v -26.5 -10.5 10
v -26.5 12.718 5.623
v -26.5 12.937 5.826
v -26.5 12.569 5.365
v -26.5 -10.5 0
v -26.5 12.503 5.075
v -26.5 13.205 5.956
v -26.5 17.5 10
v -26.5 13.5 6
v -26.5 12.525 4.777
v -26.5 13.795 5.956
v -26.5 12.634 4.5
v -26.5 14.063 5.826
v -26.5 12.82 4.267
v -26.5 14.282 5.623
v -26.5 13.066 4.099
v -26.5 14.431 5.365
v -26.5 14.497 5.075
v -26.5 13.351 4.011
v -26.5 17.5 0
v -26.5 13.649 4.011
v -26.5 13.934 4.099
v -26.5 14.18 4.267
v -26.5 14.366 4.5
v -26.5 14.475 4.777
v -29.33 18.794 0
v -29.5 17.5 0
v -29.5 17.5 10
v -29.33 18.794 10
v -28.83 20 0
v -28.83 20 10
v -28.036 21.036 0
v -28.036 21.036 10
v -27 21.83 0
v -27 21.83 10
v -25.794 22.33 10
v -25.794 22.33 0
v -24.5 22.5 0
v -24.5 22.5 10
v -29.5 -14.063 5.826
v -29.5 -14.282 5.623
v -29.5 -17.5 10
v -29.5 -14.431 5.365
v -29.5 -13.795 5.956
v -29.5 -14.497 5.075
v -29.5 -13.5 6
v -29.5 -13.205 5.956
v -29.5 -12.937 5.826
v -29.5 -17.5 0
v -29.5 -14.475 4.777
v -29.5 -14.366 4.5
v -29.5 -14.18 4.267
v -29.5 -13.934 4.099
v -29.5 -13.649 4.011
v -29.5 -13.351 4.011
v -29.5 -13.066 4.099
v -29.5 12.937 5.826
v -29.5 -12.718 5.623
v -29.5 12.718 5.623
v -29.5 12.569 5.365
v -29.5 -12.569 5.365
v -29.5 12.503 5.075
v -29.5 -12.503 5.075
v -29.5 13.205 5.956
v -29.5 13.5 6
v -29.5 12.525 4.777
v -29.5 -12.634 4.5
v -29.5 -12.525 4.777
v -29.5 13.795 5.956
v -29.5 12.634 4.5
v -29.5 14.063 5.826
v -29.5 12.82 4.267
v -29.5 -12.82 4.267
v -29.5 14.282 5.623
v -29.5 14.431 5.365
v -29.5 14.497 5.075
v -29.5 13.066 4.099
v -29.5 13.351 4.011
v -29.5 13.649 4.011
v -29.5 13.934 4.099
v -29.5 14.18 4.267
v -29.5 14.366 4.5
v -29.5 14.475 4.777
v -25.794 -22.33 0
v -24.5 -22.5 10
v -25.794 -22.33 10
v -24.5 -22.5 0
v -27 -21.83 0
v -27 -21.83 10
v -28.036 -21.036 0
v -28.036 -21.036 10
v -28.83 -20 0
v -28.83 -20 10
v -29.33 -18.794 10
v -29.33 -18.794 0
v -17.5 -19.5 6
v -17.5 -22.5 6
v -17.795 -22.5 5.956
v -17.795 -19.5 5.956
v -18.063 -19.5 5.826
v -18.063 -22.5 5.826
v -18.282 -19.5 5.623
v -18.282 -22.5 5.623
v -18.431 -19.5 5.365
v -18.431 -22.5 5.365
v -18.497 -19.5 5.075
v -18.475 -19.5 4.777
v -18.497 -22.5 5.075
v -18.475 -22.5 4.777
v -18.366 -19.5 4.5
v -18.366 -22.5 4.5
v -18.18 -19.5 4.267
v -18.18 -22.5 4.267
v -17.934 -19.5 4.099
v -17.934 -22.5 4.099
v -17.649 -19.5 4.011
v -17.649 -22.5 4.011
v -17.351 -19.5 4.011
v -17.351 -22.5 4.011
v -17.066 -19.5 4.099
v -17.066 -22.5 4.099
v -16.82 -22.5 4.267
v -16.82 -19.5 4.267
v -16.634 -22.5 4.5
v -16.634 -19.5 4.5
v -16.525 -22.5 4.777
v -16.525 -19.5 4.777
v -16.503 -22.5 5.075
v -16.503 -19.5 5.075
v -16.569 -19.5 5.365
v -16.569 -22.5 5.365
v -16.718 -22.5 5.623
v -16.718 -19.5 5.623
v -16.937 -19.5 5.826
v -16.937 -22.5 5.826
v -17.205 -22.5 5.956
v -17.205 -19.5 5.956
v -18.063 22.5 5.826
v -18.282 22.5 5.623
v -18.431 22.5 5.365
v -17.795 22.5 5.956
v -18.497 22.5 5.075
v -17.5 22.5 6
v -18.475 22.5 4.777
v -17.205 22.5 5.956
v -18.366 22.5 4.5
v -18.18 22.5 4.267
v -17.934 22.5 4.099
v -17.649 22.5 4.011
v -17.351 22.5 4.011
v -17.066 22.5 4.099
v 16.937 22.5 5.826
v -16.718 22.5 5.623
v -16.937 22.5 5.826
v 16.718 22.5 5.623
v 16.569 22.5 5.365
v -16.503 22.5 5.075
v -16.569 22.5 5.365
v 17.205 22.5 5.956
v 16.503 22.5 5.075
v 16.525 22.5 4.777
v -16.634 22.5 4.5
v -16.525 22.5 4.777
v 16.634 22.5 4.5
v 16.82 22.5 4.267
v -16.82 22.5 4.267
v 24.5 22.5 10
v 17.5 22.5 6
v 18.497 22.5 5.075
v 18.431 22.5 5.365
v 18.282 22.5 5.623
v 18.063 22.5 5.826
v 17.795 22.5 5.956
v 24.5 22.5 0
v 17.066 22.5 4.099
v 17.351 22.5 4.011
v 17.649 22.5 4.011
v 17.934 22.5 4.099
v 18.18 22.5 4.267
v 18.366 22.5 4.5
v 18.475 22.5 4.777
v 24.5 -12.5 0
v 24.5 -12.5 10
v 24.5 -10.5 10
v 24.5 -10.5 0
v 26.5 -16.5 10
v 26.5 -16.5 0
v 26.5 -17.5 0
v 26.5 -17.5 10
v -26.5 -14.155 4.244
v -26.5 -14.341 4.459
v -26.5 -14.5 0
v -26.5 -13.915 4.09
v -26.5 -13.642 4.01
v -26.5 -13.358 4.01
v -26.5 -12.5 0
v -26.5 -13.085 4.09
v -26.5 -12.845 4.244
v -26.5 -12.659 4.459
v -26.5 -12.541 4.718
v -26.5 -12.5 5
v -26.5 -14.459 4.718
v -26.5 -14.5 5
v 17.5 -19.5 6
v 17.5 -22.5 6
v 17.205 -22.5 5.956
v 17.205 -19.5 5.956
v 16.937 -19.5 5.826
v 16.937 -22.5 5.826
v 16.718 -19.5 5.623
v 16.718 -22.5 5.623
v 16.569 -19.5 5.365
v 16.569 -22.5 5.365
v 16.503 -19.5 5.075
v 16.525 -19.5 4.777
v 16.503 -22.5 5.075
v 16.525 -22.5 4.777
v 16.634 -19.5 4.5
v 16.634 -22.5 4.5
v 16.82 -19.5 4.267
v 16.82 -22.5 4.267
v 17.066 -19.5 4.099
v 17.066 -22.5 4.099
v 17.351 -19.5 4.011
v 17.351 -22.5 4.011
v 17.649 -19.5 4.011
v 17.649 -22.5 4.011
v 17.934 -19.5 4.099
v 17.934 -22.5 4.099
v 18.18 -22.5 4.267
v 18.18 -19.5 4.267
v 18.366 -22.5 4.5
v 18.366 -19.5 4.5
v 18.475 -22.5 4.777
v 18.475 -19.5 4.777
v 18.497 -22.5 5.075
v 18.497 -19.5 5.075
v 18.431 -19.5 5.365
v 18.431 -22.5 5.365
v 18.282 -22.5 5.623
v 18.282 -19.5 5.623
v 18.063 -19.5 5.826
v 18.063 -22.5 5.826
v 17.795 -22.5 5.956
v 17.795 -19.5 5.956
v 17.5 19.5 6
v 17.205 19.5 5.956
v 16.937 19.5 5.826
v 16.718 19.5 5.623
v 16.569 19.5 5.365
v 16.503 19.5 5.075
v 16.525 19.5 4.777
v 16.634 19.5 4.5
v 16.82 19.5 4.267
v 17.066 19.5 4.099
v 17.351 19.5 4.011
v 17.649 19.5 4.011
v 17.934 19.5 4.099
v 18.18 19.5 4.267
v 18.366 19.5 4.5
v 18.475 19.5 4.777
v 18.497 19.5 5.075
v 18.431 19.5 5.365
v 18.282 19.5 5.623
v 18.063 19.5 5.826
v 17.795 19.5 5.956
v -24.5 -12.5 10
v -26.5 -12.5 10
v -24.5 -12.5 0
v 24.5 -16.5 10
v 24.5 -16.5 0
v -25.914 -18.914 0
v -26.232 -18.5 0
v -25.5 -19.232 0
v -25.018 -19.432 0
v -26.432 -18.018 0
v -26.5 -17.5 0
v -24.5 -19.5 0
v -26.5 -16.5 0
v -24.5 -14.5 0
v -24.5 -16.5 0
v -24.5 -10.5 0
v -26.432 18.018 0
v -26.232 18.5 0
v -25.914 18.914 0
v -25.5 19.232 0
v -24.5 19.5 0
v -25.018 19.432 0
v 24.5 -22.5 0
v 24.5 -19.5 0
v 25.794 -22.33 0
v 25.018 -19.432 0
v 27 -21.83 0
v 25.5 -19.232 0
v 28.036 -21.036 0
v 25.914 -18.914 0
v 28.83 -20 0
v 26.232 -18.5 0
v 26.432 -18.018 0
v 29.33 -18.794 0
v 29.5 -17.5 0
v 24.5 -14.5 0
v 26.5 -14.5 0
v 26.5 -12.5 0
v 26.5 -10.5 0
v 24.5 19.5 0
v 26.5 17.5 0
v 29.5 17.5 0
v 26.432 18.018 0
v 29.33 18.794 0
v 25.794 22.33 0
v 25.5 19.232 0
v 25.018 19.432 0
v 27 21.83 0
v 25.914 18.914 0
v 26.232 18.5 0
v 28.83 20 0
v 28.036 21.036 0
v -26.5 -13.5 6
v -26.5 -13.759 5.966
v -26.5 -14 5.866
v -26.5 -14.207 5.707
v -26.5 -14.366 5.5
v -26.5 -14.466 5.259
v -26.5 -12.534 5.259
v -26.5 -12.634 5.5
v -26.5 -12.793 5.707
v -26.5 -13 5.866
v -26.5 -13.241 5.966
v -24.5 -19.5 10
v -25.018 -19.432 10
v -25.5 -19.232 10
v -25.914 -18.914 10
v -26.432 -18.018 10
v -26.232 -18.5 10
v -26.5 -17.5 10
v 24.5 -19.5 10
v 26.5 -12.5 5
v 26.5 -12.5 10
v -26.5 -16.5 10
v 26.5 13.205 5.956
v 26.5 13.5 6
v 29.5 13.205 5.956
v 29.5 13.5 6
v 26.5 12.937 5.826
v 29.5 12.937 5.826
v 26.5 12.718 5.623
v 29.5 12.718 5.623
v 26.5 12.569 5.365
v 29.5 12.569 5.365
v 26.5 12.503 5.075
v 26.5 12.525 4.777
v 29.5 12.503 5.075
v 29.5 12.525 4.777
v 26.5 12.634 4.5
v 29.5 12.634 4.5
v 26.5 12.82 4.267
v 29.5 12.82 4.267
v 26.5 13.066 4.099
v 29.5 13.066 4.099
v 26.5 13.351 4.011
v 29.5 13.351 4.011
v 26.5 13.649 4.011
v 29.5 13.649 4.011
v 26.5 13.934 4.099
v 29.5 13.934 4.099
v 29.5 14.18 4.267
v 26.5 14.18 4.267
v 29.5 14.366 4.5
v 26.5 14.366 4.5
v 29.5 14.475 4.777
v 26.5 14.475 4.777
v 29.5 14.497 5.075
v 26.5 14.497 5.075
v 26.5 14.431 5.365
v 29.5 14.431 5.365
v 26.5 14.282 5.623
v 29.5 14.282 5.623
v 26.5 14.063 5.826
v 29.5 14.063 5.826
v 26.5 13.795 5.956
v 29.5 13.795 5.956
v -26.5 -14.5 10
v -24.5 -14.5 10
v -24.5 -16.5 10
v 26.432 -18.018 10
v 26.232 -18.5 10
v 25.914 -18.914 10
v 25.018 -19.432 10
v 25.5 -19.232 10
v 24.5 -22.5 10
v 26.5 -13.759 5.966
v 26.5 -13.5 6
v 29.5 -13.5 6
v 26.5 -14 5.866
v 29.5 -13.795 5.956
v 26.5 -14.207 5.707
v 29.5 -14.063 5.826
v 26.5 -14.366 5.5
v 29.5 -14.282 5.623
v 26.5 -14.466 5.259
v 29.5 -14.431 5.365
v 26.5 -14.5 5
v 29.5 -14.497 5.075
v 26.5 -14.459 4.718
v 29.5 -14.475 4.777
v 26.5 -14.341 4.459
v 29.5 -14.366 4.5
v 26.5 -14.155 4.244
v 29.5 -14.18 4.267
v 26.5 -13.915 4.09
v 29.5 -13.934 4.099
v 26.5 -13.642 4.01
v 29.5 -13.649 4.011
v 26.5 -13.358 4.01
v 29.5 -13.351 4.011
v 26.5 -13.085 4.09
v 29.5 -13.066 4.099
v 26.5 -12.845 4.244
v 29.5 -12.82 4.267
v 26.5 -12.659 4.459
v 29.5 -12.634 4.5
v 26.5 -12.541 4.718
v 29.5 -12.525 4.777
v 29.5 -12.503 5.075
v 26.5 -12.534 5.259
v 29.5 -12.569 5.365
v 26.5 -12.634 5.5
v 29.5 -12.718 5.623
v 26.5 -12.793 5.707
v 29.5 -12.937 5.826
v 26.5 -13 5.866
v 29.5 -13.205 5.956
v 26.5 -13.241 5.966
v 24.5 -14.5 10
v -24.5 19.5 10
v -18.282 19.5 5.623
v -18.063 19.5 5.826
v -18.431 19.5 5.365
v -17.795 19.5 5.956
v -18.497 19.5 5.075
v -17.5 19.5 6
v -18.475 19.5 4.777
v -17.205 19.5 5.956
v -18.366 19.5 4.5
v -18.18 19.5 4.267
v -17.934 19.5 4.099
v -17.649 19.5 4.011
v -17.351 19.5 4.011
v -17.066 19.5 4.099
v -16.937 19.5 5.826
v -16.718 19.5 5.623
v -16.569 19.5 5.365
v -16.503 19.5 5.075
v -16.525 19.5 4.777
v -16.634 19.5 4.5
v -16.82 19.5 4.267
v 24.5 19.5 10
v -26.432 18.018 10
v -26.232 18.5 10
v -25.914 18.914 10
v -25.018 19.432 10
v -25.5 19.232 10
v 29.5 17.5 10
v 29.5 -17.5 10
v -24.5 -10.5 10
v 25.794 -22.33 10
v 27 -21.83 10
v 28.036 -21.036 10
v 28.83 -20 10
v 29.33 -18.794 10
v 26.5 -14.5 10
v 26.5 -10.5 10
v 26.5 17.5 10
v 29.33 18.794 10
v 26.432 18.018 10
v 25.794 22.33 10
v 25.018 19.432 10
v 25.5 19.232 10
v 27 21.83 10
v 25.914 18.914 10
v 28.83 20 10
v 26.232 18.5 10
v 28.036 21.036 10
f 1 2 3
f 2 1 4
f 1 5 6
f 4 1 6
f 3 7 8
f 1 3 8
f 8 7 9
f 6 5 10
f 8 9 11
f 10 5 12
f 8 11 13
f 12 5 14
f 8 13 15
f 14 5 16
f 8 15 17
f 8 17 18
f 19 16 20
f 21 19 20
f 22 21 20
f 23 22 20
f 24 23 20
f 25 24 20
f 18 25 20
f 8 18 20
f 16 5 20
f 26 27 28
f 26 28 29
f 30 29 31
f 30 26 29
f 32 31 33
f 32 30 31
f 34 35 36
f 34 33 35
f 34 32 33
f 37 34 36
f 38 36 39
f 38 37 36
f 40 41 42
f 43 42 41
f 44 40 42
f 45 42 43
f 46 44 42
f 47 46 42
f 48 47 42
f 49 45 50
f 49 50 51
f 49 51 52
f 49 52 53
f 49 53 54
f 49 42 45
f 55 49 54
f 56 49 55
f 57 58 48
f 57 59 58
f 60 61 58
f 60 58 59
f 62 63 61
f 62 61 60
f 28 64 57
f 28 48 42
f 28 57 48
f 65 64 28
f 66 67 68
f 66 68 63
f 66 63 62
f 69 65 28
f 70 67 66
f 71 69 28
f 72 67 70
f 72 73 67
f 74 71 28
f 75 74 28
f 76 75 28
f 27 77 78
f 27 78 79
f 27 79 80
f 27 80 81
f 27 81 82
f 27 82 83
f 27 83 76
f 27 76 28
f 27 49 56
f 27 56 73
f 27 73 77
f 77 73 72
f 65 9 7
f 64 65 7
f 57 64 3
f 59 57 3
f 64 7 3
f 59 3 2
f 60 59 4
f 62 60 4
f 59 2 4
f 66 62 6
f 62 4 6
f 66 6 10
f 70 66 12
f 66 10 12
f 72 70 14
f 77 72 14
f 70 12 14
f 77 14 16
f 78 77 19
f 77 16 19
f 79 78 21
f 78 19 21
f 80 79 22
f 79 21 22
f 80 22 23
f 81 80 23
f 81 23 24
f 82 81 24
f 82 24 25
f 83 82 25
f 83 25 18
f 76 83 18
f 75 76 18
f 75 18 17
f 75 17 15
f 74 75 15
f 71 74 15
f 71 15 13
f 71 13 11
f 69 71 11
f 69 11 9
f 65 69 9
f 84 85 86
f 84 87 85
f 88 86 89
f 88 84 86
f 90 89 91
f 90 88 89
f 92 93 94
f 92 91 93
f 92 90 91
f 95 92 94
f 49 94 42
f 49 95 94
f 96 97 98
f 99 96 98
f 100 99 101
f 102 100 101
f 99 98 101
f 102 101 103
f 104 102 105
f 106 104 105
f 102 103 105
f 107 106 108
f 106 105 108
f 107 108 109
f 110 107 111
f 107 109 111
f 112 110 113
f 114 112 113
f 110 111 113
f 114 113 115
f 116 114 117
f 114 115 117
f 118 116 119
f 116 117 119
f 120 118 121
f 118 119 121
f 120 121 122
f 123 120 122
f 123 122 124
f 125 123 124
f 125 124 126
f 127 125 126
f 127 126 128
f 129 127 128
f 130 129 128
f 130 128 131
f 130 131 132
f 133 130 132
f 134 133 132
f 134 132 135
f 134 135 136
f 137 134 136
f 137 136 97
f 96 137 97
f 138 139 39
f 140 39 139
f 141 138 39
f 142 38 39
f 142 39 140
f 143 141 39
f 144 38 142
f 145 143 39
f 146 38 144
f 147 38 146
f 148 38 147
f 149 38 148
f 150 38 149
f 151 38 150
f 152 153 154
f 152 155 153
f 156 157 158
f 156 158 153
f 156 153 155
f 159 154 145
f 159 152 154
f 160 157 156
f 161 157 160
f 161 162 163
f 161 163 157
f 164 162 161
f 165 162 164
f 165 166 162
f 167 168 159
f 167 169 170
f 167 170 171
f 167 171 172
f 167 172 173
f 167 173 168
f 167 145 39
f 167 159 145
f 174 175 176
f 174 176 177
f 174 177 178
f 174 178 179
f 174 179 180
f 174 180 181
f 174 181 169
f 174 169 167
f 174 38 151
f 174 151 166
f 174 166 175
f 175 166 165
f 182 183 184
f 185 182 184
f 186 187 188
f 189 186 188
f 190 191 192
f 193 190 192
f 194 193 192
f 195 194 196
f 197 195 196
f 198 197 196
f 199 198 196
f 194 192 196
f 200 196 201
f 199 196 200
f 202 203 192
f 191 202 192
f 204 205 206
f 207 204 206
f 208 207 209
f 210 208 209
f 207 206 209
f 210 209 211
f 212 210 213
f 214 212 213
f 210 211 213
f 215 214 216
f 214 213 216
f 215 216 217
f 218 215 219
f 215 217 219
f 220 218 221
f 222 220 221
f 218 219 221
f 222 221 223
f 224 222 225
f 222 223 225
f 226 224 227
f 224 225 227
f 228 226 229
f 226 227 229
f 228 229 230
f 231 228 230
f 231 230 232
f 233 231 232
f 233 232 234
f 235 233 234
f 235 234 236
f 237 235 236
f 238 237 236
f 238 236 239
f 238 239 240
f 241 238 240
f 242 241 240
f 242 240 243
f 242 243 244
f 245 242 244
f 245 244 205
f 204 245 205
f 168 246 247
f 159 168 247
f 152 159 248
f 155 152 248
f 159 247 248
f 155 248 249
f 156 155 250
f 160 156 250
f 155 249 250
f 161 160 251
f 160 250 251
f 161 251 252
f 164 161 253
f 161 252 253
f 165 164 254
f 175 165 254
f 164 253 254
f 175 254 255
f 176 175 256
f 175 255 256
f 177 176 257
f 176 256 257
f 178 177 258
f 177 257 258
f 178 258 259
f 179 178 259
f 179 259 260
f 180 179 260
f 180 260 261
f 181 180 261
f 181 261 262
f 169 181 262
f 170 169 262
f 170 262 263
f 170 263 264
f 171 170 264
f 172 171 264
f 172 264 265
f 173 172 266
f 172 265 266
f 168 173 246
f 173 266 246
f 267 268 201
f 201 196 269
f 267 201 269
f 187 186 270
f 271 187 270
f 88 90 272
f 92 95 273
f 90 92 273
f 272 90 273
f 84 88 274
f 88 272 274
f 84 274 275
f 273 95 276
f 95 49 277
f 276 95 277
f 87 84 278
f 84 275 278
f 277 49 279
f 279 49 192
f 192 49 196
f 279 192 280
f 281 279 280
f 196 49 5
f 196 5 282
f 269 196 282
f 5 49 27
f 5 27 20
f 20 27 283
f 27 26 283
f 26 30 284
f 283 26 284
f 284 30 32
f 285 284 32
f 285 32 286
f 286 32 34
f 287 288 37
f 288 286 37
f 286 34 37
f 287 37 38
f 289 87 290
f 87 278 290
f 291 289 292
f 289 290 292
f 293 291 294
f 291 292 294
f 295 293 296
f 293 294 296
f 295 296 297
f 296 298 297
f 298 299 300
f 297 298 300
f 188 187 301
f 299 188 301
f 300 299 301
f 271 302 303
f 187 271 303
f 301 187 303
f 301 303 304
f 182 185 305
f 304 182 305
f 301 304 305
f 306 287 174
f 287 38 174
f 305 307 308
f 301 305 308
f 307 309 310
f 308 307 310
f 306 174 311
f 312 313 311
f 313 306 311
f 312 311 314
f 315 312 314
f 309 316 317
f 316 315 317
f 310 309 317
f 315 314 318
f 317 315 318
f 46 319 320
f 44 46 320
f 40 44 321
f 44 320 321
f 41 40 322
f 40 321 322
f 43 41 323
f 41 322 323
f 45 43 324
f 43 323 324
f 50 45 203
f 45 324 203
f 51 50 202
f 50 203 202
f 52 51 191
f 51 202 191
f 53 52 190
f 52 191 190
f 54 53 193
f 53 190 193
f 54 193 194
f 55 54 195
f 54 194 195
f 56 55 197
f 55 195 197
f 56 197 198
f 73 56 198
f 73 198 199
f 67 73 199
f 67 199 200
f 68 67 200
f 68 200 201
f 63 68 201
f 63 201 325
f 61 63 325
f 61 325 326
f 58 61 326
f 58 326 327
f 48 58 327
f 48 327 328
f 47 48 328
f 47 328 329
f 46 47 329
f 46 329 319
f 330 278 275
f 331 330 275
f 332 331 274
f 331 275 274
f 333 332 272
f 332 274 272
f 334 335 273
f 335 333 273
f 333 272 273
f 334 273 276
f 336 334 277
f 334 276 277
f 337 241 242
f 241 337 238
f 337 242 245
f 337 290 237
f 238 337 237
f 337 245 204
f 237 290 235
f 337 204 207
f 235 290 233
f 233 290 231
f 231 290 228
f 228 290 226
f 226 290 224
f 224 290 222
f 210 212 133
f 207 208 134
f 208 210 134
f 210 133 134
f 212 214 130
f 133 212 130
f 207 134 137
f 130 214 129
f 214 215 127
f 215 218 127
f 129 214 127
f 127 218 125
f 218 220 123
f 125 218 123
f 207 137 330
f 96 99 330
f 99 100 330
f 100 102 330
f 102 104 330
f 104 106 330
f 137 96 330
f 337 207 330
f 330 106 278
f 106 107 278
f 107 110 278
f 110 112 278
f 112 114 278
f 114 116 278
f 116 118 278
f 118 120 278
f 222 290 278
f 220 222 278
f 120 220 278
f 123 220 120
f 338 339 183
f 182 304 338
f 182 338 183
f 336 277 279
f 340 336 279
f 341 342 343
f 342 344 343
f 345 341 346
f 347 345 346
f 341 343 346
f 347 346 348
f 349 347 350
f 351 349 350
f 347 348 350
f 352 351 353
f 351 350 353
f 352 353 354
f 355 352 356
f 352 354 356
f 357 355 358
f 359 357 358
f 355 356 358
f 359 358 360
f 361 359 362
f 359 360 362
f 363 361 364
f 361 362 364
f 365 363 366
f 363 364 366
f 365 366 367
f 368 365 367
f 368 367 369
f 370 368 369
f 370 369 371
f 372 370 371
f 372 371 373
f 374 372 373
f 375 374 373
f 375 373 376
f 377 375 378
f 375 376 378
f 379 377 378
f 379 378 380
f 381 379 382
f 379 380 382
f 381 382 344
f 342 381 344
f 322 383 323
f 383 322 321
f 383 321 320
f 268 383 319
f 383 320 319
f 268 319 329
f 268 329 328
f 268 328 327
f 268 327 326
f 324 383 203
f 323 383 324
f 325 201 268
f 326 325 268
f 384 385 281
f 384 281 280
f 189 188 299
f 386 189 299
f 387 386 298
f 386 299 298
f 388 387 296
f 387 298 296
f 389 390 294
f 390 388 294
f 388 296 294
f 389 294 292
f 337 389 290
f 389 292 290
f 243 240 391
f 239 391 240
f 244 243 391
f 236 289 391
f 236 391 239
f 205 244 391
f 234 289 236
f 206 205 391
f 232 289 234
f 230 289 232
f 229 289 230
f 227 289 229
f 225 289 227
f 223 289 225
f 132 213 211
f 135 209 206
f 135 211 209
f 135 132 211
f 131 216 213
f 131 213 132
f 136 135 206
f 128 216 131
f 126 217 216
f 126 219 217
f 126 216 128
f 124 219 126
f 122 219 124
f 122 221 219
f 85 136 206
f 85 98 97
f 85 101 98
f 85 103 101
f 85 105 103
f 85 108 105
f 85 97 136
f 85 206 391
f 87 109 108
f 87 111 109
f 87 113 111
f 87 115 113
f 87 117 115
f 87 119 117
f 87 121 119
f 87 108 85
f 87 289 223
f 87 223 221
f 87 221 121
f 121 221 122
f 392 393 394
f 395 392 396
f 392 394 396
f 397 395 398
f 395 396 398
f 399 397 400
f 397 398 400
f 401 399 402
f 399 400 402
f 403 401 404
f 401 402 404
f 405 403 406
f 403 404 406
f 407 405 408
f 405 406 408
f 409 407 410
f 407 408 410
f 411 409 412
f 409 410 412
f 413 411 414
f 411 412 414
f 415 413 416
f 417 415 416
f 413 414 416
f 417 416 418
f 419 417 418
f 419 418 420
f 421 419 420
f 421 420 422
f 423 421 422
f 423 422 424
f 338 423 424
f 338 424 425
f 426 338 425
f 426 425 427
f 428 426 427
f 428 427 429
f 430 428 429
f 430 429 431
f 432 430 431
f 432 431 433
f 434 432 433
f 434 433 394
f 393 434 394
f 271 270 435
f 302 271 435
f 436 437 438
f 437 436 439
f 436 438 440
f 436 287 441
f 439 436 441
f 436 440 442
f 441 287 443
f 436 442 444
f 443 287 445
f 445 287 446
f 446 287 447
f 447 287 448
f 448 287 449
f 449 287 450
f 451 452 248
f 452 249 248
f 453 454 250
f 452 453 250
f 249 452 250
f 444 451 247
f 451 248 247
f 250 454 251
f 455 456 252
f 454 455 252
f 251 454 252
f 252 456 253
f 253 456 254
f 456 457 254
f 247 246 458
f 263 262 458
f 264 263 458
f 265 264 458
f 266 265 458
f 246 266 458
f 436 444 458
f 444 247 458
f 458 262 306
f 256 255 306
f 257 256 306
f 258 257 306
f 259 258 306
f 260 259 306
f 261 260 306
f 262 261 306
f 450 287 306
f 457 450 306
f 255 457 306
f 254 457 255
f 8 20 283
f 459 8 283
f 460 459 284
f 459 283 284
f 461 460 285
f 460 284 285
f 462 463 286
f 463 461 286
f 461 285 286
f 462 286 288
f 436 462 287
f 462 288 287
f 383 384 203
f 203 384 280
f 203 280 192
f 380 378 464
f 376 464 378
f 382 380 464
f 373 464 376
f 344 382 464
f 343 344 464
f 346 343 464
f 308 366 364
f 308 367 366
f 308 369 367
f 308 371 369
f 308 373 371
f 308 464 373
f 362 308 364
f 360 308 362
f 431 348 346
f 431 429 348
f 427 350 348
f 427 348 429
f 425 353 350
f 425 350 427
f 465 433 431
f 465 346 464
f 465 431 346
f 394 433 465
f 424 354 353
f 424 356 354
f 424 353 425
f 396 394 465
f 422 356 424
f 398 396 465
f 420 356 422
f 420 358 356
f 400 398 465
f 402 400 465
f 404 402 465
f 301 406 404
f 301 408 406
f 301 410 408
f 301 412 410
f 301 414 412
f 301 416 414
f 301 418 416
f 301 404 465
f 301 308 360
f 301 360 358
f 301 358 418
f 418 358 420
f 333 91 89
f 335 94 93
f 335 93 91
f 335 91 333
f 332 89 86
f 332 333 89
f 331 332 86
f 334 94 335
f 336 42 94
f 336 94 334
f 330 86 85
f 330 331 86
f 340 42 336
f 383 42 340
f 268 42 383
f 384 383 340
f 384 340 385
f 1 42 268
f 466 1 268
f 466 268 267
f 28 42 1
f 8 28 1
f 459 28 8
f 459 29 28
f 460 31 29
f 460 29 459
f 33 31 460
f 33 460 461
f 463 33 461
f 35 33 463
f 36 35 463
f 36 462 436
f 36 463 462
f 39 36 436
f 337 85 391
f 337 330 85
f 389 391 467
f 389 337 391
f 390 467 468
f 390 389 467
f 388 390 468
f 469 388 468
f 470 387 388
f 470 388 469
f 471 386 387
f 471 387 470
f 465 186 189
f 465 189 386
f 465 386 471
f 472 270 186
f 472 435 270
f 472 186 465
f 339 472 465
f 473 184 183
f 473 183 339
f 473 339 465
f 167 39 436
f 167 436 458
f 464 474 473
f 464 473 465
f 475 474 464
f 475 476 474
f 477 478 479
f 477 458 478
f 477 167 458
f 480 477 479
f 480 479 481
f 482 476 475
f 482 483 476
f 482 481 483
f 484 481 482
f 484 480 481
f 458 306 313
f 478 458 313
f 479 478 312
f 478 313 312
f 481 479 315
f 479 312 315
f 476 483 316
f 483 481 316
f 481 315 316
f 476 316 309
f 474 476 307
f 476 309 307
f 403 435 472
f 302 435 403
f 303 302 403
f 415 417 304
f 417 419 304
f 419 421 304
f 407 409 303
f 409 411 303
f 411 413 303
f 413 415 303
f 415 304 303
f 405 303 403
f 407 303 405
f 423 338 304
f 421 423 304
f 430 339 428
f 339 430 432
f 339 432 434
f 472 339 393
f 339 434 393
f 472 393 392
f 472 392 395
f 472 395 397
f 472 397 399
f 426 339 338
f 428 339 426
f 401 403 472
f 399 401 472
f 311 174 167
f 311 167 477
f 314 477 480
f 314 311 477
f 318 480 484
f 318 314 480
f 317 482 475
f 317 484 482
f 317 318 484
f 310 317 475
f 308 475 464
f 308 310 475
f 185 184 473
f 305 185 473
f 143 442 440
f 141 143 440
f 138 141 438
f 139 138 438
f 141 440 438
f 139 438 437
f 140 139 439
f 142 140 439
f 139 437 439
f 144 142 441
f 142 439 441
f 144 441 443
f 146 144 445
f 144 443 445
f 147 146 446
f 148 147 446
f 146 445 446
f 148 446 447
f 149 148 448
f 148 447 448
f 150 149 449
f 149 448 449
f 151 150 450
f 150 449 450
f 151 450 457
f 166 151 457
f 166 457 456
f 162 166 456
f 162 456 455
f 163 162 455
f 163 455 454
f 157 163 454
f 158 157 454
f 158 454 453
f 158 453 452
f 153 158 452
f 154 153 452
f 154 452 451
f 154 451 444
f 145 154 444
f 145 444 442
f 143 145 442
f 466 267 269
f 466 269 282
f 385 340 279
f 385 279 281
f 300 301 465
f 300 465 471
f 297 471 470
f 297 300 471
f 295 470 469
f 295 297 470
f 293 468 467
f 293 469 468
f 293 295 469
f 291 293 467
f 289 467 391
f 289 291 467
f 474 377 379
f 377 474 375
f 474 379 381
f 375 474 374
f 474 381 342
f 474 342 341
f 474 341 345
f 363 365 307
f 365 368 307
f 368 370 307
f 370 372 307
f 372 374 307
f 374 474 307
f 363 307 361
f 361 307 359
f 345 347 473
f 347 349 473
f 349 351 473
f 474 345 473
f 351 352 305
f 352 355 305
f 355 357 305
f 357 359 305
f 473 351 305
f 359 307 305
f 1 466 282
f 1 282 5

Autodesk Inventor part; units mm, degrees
ref_plane "YZ Plane" through (0, 0, 0) normal (1, 0, 0) x (0, 1, 0)
ref_plane "XZ Plane" through (0, 0, 0) normal (0, 1, 0) x (-1, 0, 0)
ref_plane "XY Plane" through (0, 0, 0) normal (0, 0, 1) x (1, 0, 0)
sketch "Sketch1" plane through (0, 0, 0) normal (0, 0, 1) x (1, 0, 0)
  line L0 (-24.5, 22.5) -> (24.5, 22.5)
  line L1 (29.5, 17.5) -> (29.5, -17.5)
  line L2 (24.5, -22.5) -> (-24.5, -22.5)
  line L3 (-29.5, -17.5) -> (-29.5, 17.5)
  arc A0 (-24.5, 22.5) -> (-29.5, 17.5) centre (-24.5, 17.5) ccw
  arc A1 (29.5, 17.5) -> (24.5, 22.5) centre (24.5, 17.5) ccw
  arc A2 (24.5, -22.5) -> (29.5, -17.5) centre (24.5, -17.5) ccw
  arc A3 (-29.5, -17.5) -> (-24.5, -22.5) centre (-24.5, -17.5) ccw
  line L4 (-24.5, 19.5) -> (24.5, 19.5)
  line L5 (24.5, -19.5) -> (-24.5, -19.5)
  arc A4 (-24.5, 19.5) -> (-26.5, 17.5) centre (-24.5, 17.5) ccw
  arc A5 (-26.5, -17.5) -> (-24.5, -19.5) centre (-24.5, -17.5) ccw
  arc A6 (26.5, 17.5) -> (24.5, 19.5) centre (24.5, 17.5) ccw
  arc A7 (24.5, -19.5) -> (26.5, -17.5) centre (24.5, -17.5) ccw
  line L6 (-26.5, -16.5) -> (-24.5, -16.5)
  line L7 (-24.5, -16.5) -> (-24.5, -14.5)
  line L8 (-24.5, -14.5) -> (-26.5, -14.5)
  line L9 (-26.5, -12.5) -> (-24.5, -12.5)
  line L10 (-24.5, -12.5) -> (-24.5, -10.5)
  line L11 (-24.5, -10.5) -> (-26.5, -10.5)
  line L12 (26.5, -16.5) -> (24.5, -16.5)
  line L13 (24.5, -14.5) -> (26.5, -14.5)
  line L14 (26.5, -12.5) -> (24.5, -12.5)
  line L15 (24.5, -10.5) -> (26.5, -10.5)
  line L16 (-26.5, -10.5) -> (-26.5, 17.5)
  line L17 (-26.5, -17.5) -> (-26.5, -16.5)
  line L18 (-26.5, -14.5) -> (-26.5, -12.5)
  line L19 (26.5, 17.5) -> (26.5, -10.5)
  line L20 (26.5, -12.5) -> (26.5, -14.5)
  line L21 (26.5, -16.5) -> (26.5, -17.5)
  line L22 (24.5, -12.5) -> (24.5, -10.5)
  line L23 (24.5, -16.5) -> (24.5, -14.5)
  point P0 (0, 0)
  point P1 (0, 22.5)
  point P2 (-29.5, 0)
  point P3 (0, 19.5)
  point P4 (-26.5, 0)
  dimension "d0" = 5
  dimension "d1" = 59
  dimension "d2" = 45
  dimension "d4" = 3
  dimension "d6" = 3
  dimension "d7" = 2
  dimension "d8" = 2
  dimension "d9" = 3
extrude "Extrusion1" add sketch "Sketch1" along normal blind 10
sketch "Sketch3" plane through (-29.5, -17.5, 0) normal (-1, 0, 0) x (0, 0, 1)
  line L0 (0, 0) -> (0, 35) projected
  line L1 (0, 0) -> (10, 0) projected
  line L2 (10, 35) -> (10, 0) projected
  line L3 (0, 35) -> (10, 35) projected
  line L4 (5, 31) -> (5, 4) construction
  point P0 (0, 17.5)
  point P1 (5, 35)
  point P2 (0, 17.5)
  point P3 (5, 17.5)
  dimension "d20" = 27
sketch "Sketch2" plane through (-24.5, 22.5, 0) normal (0, 1, 0) x (1, 0, 0)
  line L0 (0, 0) -> (49, 0) projected
  line L1 (0, 0) -> (0, -10) projected
  line L2 (49, -10) -> (0, -10) projected
  line L3 (49, 0) -> (49, -10) projected
  line L4 (7, -5) -> (42, -5) construction
  point P0 (24.5, 0)
  point P1 (0, -5)
  point P2 (24.5, 0)
  point P3 (24.5, -5)
  dimension "d12" = 35
hole "Hole1" at (-17.5, 22.5, 5) at (17.5, 22.5, 5) direction (0, -1, 0) diameter 2 end through all
hole "Hole2" at (-29.5, 13.5, 5) at (-29.5, -13.5, 5) direction (1, 0, 0) diameter 2 end through all
equation "\"d4\" = d3"
equation "\"d6\" = d3"
equation "\"d3\" = 3"
properties part number "Board_holder"
